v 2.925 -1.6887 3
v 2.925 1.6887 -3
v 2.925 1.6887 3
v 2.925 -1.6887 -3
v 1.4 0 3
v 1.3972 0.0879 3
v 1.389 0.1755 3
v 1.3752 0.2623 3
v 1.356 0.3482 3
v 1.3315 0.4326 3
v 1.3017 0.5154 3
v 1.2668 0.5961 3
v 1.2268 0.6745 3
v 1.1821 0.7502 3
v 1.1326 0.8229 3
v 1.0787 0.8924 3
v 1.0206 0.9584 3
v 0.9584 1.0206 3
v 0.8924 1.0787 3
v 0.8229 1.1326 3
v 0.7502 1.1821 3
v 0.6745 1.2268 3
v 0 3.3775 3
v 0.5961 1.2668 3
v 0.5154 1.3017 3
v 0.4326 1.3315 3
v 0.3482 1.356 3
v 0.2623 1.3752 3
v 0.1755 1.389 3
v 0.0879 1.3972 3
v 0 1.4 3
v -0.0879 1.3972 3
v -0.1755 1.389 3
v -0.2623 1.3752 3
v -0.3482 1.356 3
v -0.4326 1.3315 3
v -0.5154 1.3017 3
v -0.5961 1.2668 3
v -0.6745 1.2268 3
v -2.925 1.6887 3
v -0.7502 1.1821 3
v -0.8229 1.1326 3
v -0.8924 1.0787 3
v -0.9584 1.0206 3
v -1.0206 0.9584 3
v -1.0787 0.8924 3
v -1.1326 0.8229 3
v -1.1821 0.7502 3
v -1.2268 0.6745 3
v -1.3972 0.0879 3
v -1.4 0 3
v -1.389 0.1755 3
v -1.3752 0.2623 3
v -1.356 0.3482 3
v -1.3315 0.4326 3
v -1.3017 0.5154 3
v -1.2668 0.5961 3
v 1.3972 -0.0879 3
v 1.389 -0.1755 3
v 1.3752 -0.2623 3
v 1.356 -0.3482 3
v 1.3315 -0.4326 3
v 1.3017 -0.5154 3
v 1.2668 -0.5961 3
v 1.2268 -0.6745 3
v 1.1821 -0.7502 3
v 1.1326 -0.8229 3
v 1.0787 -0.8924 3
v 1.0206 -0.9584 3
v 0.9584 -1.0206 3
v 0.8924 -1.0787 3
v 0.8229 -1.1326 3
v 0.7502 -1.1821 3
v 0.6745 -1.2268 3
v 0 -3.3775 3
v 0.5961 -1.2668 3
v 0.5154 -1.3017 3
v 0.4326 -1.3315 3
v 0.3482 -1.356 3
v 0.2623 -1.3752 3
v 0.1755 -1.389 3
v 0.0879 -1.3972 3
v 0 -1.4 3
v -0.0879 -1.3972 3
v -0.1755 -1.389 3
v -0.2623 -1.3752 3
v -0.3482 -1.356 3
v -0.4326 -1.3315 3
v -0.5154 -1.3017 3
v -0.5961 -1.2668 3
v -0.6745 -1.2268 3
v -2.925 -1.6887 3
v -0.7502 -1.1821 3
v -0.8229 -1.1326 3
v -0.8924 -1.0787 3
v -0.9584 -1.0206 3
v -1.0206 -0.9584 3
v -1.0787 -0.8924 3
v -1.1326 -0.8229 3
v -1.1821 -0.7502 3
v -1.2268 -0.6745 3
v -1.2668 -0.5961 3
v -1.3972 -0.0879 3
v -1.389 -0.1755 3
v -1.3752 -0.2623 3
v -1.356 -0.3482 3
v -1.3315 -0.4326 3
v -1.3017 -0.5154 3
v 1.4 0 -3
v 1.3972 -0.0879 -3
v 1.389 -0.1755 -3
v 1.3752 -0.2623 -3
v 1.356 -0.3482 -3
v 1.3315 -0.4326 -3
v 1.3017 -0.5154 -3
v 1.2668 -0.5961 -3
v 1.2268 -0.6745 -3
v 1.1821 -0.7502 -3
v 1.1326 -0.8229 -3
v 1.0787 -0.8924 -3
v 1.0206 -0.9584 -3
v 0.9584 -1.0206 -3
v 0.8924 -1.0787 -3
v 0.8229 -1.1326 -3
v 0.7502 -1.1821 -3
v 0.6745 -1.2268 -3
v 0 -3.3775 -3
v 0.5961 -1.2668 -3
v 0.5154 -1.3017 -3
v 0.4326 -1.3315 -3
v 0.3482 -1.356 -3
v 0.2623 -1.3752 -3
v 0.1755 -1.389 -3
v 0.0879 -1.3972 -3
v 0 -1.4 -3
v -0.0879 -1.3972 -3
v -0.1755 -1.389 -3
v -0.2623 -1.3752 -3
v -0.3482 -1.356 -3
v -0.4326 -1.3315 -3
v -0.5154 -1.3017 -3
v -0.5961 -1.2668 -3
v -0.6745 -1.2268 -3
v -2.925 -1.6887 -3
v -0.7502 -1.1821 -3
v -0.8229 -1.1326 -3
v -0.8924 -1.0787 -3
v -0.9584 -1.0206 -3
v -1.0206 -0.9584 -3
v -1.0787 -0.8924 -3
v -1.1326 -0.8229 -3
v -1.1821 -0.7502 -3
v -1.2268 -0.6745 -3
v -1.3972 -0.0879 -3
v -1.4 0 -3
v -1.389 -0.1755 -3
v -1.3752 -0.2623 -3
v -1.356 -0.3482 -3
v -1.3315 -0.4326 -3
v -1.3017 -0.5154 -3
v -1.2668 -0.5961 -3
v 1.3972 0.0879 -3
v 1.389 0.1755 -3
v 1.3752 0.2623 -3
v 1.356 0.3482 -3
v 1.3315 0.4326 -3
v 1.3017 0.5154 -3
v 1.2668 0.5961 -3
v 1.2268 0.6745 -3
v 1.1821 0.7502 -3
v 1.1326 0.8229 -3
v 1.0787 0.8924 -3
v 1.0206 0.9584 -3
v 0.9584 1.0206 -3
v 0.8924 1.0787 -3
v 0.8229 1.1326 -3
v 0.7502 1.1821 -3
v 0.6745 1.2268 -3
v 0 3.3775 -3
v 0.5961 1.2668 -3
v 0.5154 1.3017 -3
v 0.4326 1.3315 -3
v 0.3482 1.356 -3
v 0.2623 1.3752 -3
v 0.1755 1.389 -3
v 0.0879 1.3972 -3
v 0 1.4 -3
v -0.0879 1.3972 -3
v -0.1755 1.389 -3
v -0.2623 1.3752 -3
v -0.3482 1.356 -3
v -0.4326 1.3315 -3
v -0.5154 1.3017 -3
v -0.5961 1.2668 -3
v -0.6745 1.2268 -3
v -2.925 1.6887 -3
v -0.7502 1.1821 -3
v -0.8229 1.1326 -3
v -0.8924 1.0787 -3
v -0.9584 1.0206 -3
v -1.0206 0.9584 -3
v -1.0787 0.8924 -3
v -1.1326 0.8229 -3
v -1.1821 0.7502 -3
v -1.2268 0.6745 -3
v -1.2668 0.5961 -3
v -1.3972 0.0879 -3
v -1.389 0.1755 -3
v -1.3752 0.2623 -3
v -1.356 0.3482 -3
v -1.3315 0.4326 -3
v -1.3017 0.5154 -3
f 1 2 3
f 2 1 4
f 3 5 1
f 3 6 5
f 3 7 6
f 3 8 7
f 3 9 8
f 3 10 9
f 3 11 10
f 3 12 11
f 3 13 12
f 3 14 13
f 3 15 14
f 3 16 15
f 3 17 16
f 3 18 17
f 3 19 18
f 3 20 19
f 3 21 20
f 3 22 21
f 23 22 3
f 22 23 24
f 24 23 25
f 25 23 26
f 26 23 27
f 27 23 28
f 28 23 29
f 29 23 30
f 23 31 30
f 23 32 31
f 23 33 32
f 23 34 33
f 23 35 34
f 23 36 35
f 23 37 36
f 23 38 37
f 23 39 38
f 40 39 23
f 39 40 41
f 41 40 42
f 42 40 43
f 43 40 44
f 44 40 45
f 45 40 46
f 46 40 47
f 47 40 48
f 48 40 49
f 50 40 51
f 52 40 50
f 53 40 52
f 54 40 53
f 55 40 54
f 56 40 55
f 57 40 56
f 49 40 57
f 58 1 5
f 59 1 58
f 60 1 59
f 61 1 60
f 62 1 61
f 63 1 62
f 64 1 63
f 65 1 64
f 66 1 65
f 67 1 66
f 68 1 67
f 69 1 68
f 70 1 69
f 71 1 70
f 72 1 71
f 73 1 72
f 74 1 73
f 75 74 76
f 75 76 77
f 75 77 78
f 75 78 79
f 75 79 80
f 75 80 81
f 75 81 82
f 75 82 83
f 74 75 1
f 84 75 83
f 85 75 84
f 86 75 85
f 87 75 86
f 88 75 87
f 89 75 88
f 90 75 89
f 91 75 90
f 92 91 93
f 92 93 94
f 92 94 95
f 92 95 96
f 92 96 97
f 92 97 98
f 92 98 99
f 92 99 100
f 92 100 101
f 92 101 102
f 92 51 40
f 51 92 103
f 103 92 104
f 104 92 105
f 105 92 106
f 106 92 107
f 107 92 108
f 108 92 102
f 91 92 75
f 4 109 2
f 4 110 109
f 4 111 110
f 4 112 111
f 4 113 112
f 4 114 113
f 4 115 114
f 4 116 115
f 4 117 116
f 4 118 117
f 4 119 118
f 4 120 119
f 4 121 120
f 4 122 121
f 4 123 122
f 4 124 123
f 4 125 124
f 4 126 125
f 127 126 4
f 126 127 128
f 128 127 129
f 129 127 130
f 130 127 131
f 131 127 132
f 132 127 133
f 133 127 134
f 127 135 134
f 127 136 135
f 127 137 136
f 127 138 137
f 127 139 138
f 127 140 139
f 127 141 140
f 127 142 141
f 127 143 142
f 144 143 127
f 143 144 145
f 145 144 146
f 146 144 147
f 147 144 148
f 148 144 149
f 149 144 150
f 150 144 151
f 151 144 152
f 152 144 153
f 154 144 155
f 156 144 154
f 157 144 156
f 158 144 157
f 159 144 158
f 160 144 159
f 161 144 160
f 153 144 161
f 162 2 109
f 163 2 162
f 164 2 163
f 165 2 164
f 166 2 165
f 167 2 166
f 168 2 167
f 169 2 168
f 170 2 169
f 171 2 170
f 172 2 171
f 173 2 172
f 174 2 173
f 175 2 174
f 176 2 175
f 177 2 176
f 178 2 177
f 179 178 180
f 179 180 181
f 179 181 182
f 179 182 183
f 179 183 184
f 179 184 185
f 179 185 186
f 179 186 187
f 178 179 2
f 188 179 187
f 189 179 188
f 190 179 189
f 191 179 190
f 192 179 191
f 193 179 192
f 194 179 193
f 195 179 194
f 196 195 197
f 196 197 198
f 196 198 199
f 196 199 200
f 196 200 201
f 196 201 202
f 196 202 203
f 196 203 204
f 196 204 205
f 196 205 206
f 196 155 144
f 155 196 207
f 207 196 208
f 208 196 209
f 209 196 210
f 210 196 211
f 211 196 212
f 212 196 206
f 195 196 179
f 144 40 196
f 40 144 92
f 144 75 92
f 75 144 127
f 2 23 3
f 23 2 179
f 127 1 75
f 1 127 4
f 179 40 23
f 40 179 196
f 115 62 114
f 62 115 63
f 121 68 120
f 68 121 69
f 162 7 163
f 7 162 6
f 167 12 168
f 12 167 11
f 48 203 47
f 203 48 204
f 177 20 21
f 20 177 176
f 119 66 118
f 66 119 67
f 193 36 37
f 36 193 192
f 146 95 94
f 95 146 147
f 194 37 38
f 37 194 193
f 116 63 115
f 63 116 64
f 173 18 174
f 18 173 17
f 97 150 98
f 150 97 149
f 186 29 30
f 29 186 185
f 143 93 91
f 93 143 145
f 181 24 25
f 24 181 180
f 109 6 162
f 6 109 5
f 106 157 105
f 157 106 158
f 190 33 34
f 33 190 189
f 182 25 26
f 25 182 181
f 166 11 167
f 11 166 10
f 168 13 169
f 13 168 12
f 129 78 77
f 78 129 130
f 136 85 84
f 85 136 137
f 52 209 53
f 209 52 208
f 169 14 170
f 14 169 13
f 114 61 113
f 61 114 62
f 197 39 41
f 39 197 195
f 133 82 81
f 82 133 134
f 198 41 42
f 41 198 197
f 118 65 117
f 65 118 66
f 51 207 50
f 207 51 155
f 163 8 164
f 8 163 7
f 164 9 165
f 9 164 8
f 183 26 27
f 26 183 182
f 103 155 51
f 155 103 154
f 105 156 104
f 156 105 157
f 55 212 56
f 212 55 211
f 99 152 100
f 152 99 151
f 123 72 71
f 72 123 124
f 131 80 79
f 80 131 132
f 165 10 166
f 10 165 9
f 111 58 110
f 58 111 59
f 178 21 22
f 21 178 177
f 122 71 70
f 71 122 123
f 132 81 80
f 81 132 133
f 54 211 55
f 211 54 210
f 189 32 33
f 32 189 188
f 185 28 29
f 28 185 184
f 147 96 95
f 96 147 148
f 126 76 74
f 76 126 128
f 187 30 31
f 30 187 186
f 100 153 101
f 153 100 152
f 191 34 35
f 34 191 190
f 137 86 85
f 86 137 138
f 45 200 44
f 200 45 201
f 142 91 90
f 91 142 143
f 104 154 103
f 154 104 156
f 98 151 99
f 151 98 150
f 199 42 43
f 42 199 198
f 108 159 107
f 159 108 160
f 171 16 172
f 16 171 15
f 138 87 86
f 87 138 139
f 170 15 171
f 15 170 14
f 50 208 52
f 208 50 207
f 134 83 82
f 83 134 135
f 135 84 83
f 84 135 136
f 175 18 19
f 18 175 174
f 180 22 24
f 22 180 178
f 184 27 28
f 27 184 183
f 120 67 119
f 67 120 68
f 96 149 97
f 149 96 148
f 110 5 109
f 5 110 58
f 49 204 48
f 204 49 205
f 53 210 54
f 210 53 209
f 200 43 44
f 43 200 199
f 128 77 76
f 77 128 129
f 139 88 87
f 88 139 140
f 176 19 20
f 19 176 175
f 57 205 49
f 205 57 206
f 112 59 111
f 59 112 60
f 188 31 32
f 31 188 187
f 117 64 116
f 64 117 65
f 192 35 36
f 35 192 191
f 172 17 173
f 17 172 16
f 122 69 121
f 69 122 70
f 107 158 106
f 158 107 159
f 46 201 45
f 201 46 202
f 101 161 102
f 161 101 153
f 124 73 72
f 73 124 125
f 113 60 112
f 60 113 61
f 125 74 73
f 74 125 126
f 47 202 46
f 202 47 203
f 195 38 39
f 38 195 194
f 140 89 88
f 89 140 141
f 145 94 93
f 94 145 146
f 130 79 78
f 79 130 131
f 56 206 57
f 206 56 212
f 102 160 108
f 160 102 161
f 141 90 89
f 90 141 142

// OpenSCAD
// file: hexagone.scad
function cot(x)=1/tan(x);

module Hexagone(cle,h)
{
	angle = 360/6;		// 6 pans
	cote = cle * cot(angle);
	echo(angle, cot(angle), cote);
	echo(acos(.6));

	union()
	{
		rotate([0,0,0])
			cube([cle,cote,h],center=true);
		rotate([0,0,angle])
			cube([cle,cote,h],center=true);
		rotate([0,0,2*angle])
			cube([cle,cote,h],center=true);
	}
}
// file: utils.scad
module mv(x, y, z) {
    translate([x,y,z]) {
        children([0 : $children]);
   }
}

module rot(x, y, z) {
    rotate([x,y,z]) {
        children([0 : $children]);
   }
}

module trans() {
    %children();
}

module hash() {
    #children();
}

module fidt() {
    children(0);
    difference() {
        trans()
        children(1);
        hash()
        children(0);
   }
}

module fid() {
    difference() {
        children(1);
        children(0);
   }
}

module dif() {
    difference() {
        children(0);
        children(1);
   }
}

module dift() {
    children(1);
    difference() {
        trans()
        children(0);
        hash()
        children(1);
   }
}

module mirx() {
    children(0);
    mirror([1,0,0]) {
        children(0);
   }
}

module miry() {
    children(0);
    mirror([0,1,0]) {
        children(0);
   }
}

module mirz() {
    children(0);
    mirror([0,0,1]) {
        children(0);
   }
}
// main file
include<utils.scad>
include<hexagone.scad>

$fn=100;
in=2.8;
out=5.85;
h=30;

camera_screw_diam=2;
camera_depth=16;
camera_spacing=19;
camera_holder_height=19;
spacer_dist=28;
camera_holder_length=19;
side_length=camera_holder_length-8.46;

/*dif() {*/
/*[>mirx()<]*/
/*mirror()*/
    /*union() {*/
        /*mv(spacer_dist/2,0,0) {*/
            /*rot(0,0,-73)*/
            /*mv(side_length/-2-1.8,0,0)*/
            /*cube([side_length,2,camera_holder_height], center=true);*/
            /*fid() {*/
                /*cylinder(h=h+1, d=in, center=true);*/
                /*Hexagone(out, h);*/
            /*}*/
        /*}*/
        /*mv(camera_spacing/2+1,camera_depth-1.8,0)*/
            /*cube([2,19/2,camera_holder_height], center=true);*/
    /*}*/



/*mv(0,camera_depth-2,0)*/
/*rot(0,90,0)*/
/*cylinder(h=100, d=camera_screw_diam,center=true);*/
/*}*/

fid() {
    cylinder(h=h+1, d=in, center=true);
    Hexagone(out, 6);
}

/*mv(0,19,0)*/
/*cube([19,1,1], center=true);*/
